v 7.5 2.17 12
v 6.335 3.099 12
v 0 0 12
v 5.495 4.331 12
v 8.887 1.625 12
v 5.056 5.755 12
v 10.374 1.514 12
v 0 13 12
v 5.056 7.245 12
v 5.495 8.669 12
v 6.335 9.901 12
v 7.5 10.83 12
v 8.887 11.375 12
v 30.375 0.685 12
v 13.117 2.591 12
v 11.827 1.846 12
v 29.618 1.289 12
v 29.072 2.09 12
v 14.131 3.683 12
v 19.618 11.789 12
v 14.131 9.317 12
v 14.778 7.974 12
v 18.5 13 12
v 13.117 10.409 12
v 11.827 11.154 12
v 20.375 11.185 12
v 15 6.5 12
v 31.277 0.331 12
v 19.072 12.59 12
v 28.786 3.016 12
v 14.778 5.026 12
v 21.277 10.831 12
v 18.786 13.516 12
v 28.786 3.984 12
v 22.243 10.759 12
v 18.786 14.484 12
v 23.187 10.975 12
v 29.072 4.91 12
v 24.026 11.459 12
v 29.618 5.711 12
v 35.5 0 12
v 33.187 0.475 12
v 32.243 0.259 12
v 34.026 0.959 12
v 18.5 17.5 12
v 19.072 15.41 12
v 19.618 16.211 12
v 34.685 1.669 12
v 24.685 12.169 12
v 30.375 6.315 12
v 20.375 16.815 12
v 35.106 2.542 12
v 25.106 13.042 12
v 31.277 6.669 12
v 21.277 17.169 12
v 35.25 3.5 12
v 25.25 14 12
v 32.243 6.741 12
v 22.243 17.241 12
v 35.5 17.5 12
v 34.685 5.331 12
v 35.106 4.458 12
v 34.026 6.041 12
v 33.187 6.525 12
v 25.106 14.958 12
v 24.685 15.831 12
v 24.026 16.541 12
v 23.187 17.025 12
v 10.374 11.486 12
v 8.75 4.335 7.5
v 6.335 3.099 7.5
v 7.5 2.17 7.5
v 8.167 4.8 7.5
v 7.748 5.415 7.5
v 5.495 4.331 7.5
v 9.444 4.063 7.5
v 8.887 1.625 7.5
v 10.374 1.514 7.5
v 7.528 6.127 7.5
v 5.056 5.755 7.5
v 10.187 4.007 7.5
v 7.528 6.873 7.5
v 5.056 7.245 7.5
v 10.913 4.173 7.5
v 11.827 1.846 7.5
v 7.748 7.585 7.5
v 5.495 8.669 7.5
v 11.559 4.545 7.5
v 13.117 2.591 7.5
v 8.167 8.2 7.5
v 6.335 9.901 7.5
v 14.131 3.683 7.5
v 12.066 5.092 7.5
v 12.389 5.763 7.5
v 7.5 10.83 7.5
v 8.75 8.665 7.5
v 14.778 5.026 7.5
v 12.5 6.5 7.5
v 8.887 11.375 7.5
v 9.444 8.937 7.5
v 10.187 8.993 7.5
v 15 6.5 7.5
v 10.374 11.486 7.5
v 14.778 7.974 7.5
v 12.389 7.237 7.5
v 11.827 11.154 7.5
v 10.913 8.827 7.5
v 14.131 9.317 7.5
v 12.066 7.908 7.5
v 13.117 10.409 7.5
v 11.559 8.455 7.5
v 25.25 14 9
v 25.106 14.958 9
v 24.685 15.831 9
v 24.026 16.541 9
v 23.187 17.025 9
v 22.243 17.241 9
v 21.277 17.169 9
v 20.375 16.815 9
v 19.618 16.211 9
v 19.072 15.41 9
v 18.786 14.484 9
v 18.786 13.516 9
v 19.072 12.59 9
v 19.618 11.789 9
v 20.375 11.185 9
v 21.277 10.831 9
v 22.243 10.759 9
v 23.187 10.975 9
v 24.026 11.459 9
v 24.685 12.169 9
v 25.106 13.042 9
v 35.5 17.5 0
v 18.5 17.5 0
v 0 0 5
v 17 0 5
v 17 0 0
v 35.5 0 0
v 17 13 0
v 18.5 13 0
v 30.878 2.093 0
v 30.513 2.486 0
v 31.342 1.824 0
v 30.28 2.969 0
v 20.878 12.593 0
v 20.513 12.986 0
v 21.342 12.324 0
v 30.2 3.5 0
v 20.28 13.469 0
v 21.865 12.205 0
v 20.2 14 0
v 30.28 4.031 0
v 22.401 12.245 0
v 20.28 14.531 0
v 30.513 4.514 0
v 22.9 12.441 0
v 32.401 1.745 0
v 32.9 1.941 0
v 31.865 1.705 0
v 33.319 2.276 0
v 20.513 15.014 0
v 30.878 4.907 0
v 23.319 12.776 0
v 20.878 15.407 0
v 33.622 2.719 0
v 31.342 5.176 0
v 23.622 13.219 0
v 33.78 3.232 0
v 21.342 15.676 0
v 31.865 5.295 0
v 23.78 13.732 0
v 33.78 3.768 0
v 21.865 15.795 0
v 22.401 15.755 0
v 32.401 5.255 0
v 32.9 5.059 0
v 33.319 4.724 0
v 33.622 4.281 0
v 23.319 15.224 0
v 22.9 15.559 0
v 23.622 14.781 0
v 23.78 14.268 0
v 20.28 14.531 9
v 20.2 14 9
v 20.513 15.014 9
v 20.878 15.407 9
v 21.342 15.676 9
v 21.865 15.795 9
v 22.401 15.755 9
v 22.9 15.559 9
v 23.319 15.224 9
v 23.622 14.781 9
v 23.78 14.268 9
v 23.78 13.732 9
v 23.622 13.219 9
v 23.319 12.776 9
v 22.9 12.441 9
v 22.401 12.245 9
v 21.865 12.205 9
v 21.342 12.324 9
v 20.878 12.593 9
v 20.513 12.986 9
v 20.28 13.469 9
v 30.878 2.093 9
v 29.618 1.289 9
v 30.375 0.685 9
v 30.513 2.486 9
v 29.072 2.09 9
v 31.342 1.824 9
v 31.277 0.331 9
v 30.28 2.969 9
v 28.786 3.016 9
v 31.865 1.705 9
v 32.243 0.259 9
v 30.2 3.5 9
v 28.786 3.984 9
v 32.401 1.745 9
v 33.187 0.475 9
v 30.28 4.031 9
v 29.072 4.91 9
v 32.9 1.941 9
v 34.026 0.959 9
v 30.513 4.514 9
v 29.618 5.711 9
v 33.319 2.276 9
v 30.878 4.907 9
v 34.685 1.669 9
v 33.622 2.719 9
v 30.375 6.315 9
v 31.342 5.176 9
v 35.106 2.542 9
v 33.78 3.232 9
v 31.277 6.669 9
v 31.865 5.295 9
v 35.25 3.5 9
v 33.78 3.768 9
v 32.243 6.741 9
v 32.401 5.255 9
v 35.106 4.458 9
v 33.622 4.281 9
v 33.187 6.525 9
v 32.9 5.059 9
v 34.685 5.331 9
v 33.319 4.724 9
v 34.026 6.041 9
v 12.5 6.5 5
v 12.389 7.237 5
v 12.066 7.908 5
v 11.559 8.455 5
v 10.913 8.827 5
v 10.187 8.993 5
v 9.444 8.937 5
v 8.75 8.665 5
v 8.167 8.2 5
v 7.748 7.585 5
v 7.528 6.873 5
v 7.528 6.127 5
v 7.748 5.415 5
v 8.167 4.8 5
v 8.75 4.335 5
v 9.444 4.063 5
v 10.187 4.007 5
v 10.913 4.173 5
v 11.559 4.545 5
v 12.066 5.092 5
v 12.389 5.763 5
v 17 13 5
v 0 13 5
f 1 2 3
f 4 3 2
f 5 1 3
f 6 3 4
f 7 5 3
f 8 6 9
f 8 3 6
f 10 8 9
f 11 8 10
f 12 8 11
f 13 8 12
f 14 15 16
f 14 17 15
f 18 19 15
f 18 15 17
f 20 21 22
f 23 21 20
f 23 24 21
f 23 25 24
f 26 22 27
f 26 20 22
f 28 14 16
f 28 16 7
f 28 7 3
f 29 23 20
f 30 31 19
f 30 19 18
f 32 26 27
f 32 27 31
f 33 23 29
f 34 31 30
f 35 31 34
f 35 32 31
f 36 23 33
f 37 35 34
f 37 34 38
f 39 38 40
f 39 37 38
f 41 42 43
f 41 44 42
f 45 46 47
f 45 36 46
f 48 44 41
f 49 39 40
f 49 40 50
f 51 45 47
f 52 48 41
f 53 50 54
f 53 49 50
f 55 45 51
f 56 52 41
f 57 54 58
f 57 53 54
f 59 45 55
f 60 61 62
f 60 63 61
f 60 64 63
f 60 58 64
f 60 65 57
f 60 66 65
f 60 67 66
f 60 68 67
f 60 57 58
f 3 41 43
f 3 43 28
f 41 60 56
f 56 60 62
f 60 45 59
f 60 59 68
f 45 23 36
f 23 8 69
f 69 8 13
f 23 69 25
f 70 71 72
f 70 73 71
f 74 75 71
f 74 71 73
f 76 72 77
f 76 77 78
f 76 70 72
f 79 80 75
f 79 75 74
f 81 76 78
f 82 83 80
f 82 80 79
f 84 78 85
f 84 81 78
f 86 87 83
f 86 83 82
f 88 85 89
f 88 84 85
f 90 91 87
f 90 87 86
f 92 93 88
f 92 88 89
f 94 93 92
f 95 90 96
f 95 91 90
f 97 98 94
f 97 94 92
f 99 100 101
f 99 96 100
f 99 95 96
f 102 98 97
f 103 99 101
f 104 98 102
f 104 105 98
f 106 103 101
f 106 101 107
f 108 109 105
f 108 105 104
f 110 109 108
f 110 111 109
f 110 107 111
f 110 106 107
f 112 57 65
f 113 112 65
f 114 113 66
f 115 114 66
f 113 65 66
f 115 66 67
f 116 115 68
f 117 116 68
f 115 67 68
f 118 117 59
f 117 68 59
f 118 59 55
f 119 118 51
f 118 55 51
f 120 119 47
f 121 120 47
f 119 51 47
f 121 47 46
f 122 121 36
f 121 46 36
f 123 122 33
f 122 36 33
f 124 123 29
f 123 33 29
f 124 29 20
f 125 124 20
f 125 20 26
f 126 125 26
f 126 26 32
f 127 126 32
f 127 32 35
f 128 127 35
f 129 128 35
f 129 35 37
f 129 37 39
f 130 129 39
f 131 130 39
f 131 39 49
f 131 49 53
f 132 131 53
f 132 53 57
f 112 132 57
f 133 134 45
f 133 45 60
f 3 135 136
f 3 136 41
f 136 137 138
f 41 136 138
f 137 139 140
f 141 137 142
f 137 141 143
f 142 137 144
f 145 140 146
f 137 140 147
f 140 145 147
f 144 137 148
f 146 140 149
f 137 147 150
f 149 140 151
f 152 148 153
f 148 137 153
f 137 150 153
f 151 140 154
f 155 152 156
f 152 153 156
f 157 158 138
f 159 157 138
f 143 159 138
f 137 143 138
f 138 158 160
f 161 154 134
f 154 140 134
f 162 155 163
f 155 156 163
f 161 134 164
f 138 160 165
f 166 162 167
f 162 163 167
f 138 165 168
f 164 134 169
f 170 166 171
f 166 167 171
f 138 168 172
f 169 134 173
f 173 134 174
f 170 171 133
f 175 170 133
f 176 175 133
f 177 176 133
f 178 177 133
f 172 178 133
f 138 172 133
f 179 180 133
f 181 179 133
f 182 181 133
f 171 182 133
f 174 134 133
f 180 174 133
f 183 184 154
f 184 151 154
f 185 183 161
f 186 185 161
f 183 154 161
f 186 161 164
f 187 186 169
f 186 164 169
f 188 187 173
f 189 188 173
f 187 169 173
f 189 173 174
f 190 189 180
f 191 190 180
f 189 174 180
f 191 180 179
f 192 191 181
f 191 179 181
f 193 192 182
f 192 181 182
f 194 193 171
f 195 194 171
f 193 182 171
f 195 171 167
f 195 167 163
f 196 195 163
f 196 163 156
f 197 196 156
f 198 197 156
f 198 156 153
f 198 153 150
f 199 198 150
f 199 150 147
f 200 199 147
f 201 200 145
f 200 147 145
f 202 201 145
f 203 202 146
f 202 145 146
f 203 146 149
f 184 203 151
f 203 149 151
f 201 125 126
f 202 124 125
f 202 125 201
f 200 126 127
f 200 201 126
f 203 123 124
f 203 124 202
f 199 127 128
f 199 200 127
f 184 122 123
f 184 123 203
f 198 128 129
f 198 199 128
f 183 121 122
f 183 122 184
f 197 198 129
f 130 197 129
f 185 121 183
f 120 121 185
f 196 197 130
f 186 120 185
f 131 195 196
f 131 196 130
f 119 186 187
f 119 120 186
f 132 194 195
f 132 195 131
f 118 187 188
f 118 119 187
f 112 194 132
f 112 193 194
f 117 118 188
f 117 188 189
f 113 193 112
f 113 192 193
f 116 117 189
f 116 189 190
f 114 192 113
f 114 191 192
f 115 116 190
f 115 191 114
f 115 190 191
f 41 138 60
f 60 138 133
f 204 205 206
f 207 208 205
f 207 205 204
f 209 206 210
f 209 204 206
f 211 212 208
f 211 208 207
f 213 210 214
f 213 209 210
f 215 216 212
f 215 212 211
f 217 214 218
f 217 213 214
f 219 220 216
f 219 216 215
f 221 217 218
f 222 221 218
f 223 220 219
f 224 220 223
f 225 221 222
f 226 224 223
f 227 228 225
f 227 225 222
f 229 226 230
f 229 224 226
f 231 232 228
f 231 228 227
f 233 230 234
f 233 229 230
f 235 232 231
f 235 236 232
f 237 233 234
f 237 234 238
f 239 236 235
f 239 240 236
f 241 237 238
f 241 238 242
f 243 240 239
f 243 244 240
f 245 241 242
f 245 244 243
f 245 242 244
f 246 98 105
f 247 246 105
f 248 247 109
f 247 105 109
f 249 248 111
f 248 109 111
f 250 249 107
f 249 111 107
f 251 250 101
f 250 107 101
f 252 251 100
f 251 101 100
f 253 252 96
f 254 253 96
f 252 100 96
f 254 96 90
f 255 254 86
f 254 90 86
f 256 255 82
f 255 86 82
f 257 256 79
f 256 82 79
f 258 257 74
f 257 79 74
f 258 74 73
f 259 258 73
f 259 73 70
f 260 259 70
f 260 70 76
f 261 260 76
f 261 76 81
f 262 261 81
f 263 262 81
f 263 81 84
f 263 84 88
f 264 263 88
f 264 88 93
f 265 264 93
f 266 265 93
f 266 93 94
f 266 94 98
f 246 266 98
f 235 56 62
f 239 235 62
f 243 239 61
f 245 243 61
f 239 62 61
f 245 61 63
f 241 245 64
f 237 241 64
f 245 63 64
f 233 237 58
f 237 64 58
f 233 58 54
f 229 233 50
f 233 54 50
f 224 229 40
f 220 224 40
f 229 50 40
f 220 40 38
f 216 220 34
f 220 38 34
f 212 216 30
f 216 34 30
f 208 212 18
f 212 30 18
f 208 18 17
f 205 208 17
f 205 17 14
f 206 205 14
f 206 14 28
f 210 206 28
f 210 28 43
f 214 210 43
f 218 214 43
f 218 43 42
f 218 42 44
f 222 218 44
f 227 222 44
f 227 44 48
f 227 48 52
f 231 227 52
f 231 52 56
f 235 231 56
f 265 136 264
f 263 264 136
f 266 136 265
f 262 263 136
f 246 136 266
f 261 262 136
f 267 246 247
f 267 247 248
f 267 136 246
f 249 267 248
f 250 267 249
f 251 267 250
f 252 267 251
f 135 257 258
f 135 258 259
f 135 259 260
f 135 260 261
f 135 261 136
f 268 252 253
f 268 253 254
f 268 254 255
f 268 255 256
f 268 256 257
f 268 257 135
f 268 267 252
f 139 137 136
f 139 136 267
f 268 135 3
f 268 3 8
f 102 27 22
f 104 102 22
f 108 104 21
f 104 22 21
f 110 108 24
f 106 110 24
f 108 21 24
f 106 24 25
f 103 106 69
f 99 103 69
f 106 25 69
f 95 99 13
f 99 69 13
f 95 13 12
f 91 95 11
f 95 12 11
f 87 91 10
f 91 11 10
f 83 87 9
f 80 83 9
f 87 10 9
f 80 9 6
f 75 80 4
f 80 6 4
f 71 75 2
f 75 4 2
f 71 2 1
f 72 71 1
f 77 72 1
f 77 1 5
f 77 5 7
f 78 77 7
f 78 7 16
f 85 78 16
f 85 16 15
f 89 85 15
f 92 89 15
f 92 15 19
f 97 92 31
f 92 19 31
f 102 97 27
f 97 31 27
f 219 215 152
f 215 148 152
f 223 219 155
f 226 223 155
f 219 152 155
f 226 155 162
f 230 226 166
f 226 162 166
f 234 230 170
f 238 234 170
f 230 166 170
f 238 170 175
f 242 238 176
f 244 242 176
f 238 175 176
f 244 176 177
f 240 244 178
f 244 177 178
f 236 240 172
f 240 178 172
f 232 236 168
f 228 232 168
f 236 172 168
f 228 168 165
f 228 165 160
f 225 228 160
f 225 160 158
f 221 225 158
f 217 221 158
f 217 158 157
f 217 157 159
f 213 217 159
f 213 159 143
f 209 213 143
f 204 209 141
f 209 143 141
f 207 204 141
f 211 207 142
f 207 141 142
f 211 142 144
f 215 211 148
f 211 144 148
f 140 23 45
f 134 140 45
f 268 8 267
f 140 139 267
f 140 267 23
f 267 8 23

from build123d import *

# Parameters (mm, degrees)
SKETCH_1_W                   = 35.5
SKETCH_1_H                   = 17.5
EXTRUDE_1_DEPTH              = 12
SKETCH_2_W                   = 18.5
SKETCH_2_H                   = 4.5
CUT_EXTRUDE_1_DEPTH          = 42.35819145
SKETCH_3_R                   = 5
CUT_EXTRUDE_2_DEPTH          = 4.5
HOLE_WIZARD_M3_1_D           = 3.6
HOLE_WIZARD_M3_1_CBORE_D     = 6.5
HOLE_WIZARD_M3_1_CBORE_DEPTH = 3
SKETCH_8_R                   = 2.5
CUT_EXTRUDE_3_DEPTH          = 41.283371259
SKETCH_10_W                  = 17
SKETCH_10_H                  = 13
CUT_EXTRUDE_4_DEPTH          = 5


with BuildPart() as part:
    # 草图1 → 凸台-拉伸1 (new body)
    with BuildSketch(Plane.XY):
        with Locations((17.75, 8.75)):
            Rectangle(SKETCH_1_W, SKETCH_1_H)
    extrude(amount=EXTRUDE_1_DEPTH)

    # 草图2 → 切除-拉伸1 (cut, through all)
    with BuildSketch(Plane.XY.offset(12)):
        with Locations((9.25, 15.25)):
            Rectangle(SKETCH_2_W, SKETCH_2_H)
    extrude(amount=-CUT_EXTRUDE_1_DEPTH, mode=Mode.SUBTRACT)

    # 草图3 → 切除-拉伸2 (cut)
    with BuildSketch(Plane.XY.offset(12)):
        with Locations((10, 6.5)):
            Circle(SKETCH_3_R)
    extrude(amount=-CUT_EXTRUDE_2_DEPTH, mode=Mode.SUBTRACT)

    # M3 六角凹头螺钉的柱形沉头孔1 (through all)
    with Locations(Plane.XY.offset(12)):
        with Locations((22, 14), (32, 3.5)):
            CounterBoreHole(HOLE_WIZARD_M3_1_D / 2, HOLE_WIZARD_M3_1_CBORE_D / 2, HOLE_WIZARD_M3_1_CBORE_DEPTH)

    # 草图8 → 切除-拉伸3 (cut, through all)
    with BuildSketch(Plane.XY.offset(7.5)):
        with Locations((10, 6.5)):
            Circle(SKETCH_8_R)
    extrude(amount=-CUT_EXTRUDE_3_DEPTH, mode=Mode.SUBTRACT)

    # 草图10 → 切除-拉伸4 (cut)
    with BuildSketch(Plane(origin=(0, 0, 0), x_dir=(-1, 0, 0), z_dir=(0, 0, -1))):
        with Locations((-8.5, 6.5)):
            Rectangle(SKETCH_10_W, SKETCH_10_H)
    extrude(amount=-CUT_EXTRUDE_4_DEPTH, mode=Mode.SUBTRACT)


solid = part.part
